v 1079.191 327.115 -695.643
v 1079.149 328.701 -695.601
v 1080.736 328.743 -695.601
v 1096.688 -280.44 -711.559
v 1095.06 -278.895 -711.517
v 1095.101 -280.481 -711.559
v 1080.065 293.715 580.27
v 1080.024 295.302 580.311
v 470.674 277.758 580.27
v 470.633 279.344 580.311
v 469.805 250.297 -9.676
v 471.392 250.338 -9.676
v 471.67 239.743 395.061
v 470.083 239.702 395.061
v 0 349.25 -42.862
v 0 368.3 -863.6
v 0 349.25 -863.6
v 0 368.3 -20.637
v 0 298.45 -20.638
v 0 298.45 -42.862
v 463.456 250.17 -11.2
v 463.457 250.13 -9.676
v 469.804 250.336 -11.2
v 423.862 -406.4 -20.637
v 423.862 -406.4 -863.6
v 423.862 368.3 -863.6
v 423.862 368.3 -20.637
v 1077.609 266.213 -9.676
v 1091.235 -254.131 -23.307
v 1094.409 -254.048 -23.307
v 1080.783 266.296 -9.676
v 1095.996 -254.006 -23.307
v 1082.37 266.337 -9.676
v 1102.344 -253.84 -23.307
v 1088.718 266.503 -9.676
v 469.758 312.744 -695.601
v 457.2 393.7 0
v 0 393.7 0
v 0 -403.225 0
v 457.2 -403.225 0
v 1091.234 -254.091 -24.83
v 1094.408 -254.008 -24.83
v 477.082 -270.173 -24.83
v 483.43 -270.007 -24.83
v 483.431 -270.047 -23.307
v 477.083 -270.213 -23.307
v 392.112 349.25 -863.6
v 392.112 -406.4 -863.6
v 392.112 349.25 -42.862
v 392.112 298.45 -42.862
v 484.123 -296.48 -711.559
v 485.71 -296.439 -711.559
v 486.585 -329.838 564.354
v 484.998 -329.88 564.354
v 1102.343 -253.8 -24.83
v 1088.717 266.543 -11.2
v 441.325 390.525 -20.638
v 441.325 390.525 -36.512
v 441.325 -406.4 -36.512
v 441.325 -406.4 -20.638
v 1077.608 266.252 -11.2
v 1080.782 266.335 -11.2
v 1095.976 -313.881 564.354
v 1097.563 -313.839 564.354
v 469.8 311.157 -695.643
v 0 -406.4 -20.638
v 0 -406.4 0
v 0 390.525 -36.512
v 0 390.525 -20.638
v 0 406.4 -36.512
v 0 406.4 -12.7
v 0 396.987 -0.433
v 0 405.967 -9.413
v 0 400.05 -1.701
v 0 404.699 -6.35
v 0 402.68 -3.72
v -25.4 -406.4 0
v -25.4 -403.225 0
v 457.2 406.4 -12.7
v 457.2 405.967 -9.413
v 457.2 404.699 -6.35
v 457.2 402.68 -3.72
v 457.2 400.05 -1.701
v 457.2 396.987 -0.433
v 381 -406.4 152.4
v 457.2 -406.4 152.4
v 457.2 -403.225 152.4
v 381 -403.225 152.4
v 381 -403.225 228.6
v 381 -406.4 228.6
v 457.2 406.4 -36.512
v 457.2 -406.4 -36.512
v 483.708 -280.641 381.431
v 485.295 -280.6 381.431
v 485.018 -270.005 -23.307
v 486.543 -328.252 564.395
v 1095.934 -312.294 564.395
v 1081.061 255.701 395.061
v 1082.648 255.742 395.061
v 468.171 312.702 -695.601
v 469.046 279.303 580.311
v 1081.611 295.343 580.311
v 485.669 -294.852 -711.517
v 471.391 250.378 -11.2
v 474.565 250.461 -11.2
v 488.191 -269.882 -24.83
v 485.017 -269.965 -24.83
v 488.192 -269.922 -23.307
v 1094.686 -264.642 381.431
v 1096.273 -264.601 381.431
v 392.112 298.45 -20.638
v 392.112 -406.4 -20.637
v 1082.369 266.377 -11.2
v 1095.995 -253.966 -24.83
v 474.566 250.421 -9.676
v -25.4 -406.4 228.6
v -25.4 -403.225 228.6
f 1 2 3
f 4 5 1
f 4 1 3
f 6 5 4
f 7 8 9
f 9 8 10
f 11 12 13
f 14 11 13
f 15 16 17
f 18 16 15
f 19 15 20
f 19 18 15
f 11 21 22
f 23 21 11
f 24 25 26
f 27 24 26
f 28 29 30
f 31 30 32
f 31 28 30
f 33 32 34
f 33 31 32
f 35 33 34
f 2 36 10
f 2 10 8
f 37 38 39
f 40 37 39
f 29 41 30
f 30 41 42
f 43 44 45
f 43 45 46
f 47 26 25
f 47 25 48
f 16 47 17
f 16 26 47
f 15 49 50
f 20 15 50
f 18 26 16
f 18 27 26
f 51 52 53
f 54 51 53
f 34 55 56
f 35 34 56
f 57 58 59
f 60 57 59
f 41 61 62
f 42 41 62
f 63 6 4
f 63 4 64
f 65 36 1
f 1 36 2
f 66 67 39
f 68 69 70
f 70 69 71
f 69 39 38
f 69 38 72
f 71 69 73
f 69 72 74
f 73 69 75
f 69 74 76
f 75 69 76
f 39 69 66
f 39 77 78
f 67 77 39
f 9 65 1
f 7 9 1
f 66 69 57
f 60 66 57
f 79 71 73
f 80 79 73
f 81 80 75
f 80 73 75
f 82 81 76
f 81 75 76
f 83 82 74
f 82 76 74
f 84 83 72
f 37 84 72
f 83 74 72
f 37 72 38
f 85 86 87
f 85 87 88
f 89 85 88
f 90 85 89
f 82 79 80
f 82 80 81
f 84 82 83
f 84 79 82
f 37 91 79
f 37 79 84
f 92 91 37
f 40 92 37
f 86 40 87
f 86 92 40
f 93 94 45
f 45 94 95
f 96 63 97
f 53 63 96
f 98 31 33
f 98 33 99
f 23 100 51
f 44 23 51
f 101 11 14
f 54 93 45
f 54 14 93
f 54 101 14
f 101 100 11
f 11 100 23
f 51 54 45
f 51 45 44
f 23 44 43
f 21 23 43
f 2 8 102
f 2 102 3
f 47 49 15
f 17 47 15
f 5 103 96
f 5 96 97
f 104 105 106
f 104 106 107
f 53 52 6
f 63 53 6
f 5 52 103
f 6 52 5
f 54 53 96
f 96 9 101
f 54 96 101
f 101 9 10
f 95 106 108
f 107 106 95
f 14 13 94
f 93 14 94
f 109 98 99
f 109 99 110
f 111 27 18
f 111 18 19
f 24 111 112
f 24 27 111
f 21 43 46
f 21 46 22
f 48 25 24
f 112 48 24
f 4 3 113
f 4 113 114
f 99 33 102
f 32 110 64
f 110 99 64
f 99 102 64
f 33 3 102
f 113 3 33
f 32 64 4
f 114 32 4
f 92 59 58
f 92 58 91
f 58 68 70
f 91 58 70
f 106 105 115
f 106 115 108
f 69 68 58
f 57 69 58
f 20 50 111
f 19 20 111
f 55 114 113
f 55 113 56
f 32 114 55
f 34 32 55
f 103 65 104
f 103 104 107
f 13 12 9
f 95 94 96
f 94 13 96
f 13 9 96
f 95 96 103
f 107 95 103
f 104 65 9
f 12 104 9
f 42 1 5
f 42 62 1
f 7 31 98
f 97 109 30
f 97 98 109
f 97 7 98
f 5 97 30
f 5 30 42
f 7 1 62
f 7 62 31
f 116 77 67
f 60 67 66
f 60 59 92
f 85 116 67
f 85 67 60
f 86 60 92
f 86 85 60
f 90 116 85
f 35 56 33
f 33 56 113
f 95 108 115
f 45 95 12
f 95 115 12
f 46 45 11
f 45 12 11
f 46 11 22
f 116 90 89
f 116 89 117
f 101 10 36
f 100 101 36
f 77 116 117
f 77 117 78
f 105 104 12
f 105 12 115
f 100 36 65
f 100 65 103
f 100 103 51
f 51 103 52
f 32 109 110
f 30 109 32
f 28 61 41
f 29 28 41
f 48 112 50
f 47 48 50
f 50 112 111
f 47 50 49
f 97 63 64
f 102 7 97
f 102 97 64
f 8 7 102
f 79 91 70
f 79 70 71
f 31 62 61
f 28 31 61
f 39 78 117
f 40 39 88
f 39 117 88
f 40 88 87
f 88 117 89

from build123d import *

# Parameters (mm, degrees)
F2_DEPTH  = 457.2
F3_W      = 441.325
F3_H      = 796.925
F4_DEPTH  = 15.875
F11_DEPTH = 3.175
F13_W     = 774.7
F13_H     = 842.9625
F14_DEPTH = 31.75
F17_DEPTH = 1.5875
F21_DEPTH = 1.5875
F23_W     = 392.1125
F23_H     = 842.9625
F24_DEPTH = 19.05
F25_W     = 50.8
F25_H     = 22.225
F26_DEPTH = 392.1125
F28_DEPTH = 1.524


with BuildPart() as f2:
    # F1 (on Right) → F2 (new body)
    with BuildSketch(Plane.YZ):
        with BuildLine():
            Line((393.7, 0), (-406.4, 0))
            Line((-406.4, 0), (-406.4, -36.5125))
            Line((-406.4, -36.5125), (406.4, -36.5125))
            Line((406.4, -36.5125), (406.4, -12.7))
            ThreePointArc((406.4, -12.7), (402.6802561211, -3.7197438789), (393.7, 0))
        make_face()
    extrude(amount=F2_DEPTH)

    # F3 (on face) → F4 (cut)
    with BuildSketch(Plane(origin=(0, 0, -36.5125), x_dir=(1, 0, 0), z_dir=(0, 0, -1))):
        with Locations((220.6625, 7.9375)):
            Rectangle(F3_W, F3_H)
    extrude(amount=-F4_DEPTH, mode=Mode.SUBTRACT)

    # F10 (on offset) → F11 (join)
    with BuildSketch(Plane.XZ.offset(406.4)):
        Polygon((274.5299355409, 0), (457.2, 0), (457.2, 152.4), (381, 152.4), (381, 228.6), (-25.4, 228.6), (-25.4, 0), align=None)
    extrude(amount=-F11_DEPTH)


with BuildPart() as f14:
    # F13 (on offset) → F14 (new body)
    with BuildSketch(Plane.YZ.offset(423.8625)):
        with Locations((-19.05, -442.11875)):
            Rectangle(F13_W, F13_H)
    extrude(amount=-F14_DEPTH)

    # F23 (on face) → F24 (join)
    with BuildSketch(Plane(origin=(0, 368.3, 0), x_dir=(-1, 0, 0), z_dir=(0, 1, 0))):
        with Locations((-196.05625, -442.11875)):
            Rectangle(F23_W, F23_H)
    extrude(amount=-F24_DEPTH)

    # F25 (on face) → F26 (join, through all)
    with BuildSketch(Plane(origin=(392.1125, 0, 0), x_dir=(0, -1, 0), z_dir=(-1, 0, 0))):
        with Locations((-323.85, -31.75)):
            Rectangle(F25_W, F25_H)
    extrude(amount=F26_DEPTH)


with BuildPart() as f17:
    # F16 (on offset) → F17 (new body)
    with BuildSketch(Plane(origin=(477.6201094775, 12.5069227266, 0), x_dir=(0.0261769483, -0.999657325, 0), z_dir=(-0.999657325, -0.0261769483, 0))):
        Polygon((-266.9286201536, 580.3113605768), (-300.3395681263, -695.6012661558), (309.0515371788, -711.5587338442), (342.4624851515, 564.3538928883), align=None)
        Polygon((282.5689202331, -24.8301750237), (-237.9526488816, -11.1998380398), (-227.3143370893, 395.0608988303), (293.2072320255, 381.4305618463), align=None, mode=Mode.SUBTRACT)
    extrude(amount=F17_DEPTH)


with BuildPart() as f18_1:
    # F18: instance of F17
    add(f17.part.mirror(Plane(origin=(782.32, 20.32, -101.6), x_dir=(0.0261769483, -0.999657325, 0), z_dir=(-0.999657325, -0.0261769483, 0))))


with BuildPart() as f17_1:
    add(f17.part)

    add(f18_1.part)  # F21 merges F18_1
    # F20 (on plane+point) → F21 (join)
    with BuildSketch(Plane(origin=(-7.3801007247, 281.8346761317, 7.3826305678), x_dir=(0.9996575598, 0.0261590049, 0.0006852325), z_dir=(0.0261679781, -0.9993147674, -0.0261769483))):
        Polygon((1086.9015409083, -703.9700752338), (1087.776437166, 572.3796249098), (478.176580381, 572.7974858089), (477.3016841234, -703.5522143346), align=None)
    extrude(amount=F21_DEPTH)


with BuildPart() as f22_1:
    # F22: instance of F17
    add(f17_1.part.mirror(Plane(origin=(782.8423262467, 0.3731653894, -101.6), x_dir=(0.0006852326, -0.0261679781, 0.999657325), z_dir=(0.0261679781, -0.9993147674, -0.0261769483))))


with BuildPart() as f17_2:
    add(f17_1.part)

    add(f22_1.part)  # F28 merges F22_1
    # F27 (on face) → F28 (join)
    with BuildSketch(Plane(origin=(-0.0119400923, 0.4559737301, -17.4189032553), x_dir=(0.9999997652, 1.79312e-05, -0.000684998), z_dir=(0.0006852326, -0.0261679781, 0.999657325))):
        Polygon((1091.2462910804, -254.6535570042), (1102.3549857122, -254.3627652791), (1088.7293163055, 266.1589260396), (1077.6206216737, 265.8681343144), align=None)
    extrude(amount=F28_DEPTH)

    # F29: F17 across plane


with BuildPart() as f17_3:
    add(f17_2.part)
    add(f17_2.part.mirror(Plane(origin=(782.32, 20.32, -101.6), x_dir=(0.0261769483, -0.999657325, 0), z_dir=(-0.999657325, -0.0261769483, 0))))


solid = Compound([f2.part, f14.part, f17_3.part])
